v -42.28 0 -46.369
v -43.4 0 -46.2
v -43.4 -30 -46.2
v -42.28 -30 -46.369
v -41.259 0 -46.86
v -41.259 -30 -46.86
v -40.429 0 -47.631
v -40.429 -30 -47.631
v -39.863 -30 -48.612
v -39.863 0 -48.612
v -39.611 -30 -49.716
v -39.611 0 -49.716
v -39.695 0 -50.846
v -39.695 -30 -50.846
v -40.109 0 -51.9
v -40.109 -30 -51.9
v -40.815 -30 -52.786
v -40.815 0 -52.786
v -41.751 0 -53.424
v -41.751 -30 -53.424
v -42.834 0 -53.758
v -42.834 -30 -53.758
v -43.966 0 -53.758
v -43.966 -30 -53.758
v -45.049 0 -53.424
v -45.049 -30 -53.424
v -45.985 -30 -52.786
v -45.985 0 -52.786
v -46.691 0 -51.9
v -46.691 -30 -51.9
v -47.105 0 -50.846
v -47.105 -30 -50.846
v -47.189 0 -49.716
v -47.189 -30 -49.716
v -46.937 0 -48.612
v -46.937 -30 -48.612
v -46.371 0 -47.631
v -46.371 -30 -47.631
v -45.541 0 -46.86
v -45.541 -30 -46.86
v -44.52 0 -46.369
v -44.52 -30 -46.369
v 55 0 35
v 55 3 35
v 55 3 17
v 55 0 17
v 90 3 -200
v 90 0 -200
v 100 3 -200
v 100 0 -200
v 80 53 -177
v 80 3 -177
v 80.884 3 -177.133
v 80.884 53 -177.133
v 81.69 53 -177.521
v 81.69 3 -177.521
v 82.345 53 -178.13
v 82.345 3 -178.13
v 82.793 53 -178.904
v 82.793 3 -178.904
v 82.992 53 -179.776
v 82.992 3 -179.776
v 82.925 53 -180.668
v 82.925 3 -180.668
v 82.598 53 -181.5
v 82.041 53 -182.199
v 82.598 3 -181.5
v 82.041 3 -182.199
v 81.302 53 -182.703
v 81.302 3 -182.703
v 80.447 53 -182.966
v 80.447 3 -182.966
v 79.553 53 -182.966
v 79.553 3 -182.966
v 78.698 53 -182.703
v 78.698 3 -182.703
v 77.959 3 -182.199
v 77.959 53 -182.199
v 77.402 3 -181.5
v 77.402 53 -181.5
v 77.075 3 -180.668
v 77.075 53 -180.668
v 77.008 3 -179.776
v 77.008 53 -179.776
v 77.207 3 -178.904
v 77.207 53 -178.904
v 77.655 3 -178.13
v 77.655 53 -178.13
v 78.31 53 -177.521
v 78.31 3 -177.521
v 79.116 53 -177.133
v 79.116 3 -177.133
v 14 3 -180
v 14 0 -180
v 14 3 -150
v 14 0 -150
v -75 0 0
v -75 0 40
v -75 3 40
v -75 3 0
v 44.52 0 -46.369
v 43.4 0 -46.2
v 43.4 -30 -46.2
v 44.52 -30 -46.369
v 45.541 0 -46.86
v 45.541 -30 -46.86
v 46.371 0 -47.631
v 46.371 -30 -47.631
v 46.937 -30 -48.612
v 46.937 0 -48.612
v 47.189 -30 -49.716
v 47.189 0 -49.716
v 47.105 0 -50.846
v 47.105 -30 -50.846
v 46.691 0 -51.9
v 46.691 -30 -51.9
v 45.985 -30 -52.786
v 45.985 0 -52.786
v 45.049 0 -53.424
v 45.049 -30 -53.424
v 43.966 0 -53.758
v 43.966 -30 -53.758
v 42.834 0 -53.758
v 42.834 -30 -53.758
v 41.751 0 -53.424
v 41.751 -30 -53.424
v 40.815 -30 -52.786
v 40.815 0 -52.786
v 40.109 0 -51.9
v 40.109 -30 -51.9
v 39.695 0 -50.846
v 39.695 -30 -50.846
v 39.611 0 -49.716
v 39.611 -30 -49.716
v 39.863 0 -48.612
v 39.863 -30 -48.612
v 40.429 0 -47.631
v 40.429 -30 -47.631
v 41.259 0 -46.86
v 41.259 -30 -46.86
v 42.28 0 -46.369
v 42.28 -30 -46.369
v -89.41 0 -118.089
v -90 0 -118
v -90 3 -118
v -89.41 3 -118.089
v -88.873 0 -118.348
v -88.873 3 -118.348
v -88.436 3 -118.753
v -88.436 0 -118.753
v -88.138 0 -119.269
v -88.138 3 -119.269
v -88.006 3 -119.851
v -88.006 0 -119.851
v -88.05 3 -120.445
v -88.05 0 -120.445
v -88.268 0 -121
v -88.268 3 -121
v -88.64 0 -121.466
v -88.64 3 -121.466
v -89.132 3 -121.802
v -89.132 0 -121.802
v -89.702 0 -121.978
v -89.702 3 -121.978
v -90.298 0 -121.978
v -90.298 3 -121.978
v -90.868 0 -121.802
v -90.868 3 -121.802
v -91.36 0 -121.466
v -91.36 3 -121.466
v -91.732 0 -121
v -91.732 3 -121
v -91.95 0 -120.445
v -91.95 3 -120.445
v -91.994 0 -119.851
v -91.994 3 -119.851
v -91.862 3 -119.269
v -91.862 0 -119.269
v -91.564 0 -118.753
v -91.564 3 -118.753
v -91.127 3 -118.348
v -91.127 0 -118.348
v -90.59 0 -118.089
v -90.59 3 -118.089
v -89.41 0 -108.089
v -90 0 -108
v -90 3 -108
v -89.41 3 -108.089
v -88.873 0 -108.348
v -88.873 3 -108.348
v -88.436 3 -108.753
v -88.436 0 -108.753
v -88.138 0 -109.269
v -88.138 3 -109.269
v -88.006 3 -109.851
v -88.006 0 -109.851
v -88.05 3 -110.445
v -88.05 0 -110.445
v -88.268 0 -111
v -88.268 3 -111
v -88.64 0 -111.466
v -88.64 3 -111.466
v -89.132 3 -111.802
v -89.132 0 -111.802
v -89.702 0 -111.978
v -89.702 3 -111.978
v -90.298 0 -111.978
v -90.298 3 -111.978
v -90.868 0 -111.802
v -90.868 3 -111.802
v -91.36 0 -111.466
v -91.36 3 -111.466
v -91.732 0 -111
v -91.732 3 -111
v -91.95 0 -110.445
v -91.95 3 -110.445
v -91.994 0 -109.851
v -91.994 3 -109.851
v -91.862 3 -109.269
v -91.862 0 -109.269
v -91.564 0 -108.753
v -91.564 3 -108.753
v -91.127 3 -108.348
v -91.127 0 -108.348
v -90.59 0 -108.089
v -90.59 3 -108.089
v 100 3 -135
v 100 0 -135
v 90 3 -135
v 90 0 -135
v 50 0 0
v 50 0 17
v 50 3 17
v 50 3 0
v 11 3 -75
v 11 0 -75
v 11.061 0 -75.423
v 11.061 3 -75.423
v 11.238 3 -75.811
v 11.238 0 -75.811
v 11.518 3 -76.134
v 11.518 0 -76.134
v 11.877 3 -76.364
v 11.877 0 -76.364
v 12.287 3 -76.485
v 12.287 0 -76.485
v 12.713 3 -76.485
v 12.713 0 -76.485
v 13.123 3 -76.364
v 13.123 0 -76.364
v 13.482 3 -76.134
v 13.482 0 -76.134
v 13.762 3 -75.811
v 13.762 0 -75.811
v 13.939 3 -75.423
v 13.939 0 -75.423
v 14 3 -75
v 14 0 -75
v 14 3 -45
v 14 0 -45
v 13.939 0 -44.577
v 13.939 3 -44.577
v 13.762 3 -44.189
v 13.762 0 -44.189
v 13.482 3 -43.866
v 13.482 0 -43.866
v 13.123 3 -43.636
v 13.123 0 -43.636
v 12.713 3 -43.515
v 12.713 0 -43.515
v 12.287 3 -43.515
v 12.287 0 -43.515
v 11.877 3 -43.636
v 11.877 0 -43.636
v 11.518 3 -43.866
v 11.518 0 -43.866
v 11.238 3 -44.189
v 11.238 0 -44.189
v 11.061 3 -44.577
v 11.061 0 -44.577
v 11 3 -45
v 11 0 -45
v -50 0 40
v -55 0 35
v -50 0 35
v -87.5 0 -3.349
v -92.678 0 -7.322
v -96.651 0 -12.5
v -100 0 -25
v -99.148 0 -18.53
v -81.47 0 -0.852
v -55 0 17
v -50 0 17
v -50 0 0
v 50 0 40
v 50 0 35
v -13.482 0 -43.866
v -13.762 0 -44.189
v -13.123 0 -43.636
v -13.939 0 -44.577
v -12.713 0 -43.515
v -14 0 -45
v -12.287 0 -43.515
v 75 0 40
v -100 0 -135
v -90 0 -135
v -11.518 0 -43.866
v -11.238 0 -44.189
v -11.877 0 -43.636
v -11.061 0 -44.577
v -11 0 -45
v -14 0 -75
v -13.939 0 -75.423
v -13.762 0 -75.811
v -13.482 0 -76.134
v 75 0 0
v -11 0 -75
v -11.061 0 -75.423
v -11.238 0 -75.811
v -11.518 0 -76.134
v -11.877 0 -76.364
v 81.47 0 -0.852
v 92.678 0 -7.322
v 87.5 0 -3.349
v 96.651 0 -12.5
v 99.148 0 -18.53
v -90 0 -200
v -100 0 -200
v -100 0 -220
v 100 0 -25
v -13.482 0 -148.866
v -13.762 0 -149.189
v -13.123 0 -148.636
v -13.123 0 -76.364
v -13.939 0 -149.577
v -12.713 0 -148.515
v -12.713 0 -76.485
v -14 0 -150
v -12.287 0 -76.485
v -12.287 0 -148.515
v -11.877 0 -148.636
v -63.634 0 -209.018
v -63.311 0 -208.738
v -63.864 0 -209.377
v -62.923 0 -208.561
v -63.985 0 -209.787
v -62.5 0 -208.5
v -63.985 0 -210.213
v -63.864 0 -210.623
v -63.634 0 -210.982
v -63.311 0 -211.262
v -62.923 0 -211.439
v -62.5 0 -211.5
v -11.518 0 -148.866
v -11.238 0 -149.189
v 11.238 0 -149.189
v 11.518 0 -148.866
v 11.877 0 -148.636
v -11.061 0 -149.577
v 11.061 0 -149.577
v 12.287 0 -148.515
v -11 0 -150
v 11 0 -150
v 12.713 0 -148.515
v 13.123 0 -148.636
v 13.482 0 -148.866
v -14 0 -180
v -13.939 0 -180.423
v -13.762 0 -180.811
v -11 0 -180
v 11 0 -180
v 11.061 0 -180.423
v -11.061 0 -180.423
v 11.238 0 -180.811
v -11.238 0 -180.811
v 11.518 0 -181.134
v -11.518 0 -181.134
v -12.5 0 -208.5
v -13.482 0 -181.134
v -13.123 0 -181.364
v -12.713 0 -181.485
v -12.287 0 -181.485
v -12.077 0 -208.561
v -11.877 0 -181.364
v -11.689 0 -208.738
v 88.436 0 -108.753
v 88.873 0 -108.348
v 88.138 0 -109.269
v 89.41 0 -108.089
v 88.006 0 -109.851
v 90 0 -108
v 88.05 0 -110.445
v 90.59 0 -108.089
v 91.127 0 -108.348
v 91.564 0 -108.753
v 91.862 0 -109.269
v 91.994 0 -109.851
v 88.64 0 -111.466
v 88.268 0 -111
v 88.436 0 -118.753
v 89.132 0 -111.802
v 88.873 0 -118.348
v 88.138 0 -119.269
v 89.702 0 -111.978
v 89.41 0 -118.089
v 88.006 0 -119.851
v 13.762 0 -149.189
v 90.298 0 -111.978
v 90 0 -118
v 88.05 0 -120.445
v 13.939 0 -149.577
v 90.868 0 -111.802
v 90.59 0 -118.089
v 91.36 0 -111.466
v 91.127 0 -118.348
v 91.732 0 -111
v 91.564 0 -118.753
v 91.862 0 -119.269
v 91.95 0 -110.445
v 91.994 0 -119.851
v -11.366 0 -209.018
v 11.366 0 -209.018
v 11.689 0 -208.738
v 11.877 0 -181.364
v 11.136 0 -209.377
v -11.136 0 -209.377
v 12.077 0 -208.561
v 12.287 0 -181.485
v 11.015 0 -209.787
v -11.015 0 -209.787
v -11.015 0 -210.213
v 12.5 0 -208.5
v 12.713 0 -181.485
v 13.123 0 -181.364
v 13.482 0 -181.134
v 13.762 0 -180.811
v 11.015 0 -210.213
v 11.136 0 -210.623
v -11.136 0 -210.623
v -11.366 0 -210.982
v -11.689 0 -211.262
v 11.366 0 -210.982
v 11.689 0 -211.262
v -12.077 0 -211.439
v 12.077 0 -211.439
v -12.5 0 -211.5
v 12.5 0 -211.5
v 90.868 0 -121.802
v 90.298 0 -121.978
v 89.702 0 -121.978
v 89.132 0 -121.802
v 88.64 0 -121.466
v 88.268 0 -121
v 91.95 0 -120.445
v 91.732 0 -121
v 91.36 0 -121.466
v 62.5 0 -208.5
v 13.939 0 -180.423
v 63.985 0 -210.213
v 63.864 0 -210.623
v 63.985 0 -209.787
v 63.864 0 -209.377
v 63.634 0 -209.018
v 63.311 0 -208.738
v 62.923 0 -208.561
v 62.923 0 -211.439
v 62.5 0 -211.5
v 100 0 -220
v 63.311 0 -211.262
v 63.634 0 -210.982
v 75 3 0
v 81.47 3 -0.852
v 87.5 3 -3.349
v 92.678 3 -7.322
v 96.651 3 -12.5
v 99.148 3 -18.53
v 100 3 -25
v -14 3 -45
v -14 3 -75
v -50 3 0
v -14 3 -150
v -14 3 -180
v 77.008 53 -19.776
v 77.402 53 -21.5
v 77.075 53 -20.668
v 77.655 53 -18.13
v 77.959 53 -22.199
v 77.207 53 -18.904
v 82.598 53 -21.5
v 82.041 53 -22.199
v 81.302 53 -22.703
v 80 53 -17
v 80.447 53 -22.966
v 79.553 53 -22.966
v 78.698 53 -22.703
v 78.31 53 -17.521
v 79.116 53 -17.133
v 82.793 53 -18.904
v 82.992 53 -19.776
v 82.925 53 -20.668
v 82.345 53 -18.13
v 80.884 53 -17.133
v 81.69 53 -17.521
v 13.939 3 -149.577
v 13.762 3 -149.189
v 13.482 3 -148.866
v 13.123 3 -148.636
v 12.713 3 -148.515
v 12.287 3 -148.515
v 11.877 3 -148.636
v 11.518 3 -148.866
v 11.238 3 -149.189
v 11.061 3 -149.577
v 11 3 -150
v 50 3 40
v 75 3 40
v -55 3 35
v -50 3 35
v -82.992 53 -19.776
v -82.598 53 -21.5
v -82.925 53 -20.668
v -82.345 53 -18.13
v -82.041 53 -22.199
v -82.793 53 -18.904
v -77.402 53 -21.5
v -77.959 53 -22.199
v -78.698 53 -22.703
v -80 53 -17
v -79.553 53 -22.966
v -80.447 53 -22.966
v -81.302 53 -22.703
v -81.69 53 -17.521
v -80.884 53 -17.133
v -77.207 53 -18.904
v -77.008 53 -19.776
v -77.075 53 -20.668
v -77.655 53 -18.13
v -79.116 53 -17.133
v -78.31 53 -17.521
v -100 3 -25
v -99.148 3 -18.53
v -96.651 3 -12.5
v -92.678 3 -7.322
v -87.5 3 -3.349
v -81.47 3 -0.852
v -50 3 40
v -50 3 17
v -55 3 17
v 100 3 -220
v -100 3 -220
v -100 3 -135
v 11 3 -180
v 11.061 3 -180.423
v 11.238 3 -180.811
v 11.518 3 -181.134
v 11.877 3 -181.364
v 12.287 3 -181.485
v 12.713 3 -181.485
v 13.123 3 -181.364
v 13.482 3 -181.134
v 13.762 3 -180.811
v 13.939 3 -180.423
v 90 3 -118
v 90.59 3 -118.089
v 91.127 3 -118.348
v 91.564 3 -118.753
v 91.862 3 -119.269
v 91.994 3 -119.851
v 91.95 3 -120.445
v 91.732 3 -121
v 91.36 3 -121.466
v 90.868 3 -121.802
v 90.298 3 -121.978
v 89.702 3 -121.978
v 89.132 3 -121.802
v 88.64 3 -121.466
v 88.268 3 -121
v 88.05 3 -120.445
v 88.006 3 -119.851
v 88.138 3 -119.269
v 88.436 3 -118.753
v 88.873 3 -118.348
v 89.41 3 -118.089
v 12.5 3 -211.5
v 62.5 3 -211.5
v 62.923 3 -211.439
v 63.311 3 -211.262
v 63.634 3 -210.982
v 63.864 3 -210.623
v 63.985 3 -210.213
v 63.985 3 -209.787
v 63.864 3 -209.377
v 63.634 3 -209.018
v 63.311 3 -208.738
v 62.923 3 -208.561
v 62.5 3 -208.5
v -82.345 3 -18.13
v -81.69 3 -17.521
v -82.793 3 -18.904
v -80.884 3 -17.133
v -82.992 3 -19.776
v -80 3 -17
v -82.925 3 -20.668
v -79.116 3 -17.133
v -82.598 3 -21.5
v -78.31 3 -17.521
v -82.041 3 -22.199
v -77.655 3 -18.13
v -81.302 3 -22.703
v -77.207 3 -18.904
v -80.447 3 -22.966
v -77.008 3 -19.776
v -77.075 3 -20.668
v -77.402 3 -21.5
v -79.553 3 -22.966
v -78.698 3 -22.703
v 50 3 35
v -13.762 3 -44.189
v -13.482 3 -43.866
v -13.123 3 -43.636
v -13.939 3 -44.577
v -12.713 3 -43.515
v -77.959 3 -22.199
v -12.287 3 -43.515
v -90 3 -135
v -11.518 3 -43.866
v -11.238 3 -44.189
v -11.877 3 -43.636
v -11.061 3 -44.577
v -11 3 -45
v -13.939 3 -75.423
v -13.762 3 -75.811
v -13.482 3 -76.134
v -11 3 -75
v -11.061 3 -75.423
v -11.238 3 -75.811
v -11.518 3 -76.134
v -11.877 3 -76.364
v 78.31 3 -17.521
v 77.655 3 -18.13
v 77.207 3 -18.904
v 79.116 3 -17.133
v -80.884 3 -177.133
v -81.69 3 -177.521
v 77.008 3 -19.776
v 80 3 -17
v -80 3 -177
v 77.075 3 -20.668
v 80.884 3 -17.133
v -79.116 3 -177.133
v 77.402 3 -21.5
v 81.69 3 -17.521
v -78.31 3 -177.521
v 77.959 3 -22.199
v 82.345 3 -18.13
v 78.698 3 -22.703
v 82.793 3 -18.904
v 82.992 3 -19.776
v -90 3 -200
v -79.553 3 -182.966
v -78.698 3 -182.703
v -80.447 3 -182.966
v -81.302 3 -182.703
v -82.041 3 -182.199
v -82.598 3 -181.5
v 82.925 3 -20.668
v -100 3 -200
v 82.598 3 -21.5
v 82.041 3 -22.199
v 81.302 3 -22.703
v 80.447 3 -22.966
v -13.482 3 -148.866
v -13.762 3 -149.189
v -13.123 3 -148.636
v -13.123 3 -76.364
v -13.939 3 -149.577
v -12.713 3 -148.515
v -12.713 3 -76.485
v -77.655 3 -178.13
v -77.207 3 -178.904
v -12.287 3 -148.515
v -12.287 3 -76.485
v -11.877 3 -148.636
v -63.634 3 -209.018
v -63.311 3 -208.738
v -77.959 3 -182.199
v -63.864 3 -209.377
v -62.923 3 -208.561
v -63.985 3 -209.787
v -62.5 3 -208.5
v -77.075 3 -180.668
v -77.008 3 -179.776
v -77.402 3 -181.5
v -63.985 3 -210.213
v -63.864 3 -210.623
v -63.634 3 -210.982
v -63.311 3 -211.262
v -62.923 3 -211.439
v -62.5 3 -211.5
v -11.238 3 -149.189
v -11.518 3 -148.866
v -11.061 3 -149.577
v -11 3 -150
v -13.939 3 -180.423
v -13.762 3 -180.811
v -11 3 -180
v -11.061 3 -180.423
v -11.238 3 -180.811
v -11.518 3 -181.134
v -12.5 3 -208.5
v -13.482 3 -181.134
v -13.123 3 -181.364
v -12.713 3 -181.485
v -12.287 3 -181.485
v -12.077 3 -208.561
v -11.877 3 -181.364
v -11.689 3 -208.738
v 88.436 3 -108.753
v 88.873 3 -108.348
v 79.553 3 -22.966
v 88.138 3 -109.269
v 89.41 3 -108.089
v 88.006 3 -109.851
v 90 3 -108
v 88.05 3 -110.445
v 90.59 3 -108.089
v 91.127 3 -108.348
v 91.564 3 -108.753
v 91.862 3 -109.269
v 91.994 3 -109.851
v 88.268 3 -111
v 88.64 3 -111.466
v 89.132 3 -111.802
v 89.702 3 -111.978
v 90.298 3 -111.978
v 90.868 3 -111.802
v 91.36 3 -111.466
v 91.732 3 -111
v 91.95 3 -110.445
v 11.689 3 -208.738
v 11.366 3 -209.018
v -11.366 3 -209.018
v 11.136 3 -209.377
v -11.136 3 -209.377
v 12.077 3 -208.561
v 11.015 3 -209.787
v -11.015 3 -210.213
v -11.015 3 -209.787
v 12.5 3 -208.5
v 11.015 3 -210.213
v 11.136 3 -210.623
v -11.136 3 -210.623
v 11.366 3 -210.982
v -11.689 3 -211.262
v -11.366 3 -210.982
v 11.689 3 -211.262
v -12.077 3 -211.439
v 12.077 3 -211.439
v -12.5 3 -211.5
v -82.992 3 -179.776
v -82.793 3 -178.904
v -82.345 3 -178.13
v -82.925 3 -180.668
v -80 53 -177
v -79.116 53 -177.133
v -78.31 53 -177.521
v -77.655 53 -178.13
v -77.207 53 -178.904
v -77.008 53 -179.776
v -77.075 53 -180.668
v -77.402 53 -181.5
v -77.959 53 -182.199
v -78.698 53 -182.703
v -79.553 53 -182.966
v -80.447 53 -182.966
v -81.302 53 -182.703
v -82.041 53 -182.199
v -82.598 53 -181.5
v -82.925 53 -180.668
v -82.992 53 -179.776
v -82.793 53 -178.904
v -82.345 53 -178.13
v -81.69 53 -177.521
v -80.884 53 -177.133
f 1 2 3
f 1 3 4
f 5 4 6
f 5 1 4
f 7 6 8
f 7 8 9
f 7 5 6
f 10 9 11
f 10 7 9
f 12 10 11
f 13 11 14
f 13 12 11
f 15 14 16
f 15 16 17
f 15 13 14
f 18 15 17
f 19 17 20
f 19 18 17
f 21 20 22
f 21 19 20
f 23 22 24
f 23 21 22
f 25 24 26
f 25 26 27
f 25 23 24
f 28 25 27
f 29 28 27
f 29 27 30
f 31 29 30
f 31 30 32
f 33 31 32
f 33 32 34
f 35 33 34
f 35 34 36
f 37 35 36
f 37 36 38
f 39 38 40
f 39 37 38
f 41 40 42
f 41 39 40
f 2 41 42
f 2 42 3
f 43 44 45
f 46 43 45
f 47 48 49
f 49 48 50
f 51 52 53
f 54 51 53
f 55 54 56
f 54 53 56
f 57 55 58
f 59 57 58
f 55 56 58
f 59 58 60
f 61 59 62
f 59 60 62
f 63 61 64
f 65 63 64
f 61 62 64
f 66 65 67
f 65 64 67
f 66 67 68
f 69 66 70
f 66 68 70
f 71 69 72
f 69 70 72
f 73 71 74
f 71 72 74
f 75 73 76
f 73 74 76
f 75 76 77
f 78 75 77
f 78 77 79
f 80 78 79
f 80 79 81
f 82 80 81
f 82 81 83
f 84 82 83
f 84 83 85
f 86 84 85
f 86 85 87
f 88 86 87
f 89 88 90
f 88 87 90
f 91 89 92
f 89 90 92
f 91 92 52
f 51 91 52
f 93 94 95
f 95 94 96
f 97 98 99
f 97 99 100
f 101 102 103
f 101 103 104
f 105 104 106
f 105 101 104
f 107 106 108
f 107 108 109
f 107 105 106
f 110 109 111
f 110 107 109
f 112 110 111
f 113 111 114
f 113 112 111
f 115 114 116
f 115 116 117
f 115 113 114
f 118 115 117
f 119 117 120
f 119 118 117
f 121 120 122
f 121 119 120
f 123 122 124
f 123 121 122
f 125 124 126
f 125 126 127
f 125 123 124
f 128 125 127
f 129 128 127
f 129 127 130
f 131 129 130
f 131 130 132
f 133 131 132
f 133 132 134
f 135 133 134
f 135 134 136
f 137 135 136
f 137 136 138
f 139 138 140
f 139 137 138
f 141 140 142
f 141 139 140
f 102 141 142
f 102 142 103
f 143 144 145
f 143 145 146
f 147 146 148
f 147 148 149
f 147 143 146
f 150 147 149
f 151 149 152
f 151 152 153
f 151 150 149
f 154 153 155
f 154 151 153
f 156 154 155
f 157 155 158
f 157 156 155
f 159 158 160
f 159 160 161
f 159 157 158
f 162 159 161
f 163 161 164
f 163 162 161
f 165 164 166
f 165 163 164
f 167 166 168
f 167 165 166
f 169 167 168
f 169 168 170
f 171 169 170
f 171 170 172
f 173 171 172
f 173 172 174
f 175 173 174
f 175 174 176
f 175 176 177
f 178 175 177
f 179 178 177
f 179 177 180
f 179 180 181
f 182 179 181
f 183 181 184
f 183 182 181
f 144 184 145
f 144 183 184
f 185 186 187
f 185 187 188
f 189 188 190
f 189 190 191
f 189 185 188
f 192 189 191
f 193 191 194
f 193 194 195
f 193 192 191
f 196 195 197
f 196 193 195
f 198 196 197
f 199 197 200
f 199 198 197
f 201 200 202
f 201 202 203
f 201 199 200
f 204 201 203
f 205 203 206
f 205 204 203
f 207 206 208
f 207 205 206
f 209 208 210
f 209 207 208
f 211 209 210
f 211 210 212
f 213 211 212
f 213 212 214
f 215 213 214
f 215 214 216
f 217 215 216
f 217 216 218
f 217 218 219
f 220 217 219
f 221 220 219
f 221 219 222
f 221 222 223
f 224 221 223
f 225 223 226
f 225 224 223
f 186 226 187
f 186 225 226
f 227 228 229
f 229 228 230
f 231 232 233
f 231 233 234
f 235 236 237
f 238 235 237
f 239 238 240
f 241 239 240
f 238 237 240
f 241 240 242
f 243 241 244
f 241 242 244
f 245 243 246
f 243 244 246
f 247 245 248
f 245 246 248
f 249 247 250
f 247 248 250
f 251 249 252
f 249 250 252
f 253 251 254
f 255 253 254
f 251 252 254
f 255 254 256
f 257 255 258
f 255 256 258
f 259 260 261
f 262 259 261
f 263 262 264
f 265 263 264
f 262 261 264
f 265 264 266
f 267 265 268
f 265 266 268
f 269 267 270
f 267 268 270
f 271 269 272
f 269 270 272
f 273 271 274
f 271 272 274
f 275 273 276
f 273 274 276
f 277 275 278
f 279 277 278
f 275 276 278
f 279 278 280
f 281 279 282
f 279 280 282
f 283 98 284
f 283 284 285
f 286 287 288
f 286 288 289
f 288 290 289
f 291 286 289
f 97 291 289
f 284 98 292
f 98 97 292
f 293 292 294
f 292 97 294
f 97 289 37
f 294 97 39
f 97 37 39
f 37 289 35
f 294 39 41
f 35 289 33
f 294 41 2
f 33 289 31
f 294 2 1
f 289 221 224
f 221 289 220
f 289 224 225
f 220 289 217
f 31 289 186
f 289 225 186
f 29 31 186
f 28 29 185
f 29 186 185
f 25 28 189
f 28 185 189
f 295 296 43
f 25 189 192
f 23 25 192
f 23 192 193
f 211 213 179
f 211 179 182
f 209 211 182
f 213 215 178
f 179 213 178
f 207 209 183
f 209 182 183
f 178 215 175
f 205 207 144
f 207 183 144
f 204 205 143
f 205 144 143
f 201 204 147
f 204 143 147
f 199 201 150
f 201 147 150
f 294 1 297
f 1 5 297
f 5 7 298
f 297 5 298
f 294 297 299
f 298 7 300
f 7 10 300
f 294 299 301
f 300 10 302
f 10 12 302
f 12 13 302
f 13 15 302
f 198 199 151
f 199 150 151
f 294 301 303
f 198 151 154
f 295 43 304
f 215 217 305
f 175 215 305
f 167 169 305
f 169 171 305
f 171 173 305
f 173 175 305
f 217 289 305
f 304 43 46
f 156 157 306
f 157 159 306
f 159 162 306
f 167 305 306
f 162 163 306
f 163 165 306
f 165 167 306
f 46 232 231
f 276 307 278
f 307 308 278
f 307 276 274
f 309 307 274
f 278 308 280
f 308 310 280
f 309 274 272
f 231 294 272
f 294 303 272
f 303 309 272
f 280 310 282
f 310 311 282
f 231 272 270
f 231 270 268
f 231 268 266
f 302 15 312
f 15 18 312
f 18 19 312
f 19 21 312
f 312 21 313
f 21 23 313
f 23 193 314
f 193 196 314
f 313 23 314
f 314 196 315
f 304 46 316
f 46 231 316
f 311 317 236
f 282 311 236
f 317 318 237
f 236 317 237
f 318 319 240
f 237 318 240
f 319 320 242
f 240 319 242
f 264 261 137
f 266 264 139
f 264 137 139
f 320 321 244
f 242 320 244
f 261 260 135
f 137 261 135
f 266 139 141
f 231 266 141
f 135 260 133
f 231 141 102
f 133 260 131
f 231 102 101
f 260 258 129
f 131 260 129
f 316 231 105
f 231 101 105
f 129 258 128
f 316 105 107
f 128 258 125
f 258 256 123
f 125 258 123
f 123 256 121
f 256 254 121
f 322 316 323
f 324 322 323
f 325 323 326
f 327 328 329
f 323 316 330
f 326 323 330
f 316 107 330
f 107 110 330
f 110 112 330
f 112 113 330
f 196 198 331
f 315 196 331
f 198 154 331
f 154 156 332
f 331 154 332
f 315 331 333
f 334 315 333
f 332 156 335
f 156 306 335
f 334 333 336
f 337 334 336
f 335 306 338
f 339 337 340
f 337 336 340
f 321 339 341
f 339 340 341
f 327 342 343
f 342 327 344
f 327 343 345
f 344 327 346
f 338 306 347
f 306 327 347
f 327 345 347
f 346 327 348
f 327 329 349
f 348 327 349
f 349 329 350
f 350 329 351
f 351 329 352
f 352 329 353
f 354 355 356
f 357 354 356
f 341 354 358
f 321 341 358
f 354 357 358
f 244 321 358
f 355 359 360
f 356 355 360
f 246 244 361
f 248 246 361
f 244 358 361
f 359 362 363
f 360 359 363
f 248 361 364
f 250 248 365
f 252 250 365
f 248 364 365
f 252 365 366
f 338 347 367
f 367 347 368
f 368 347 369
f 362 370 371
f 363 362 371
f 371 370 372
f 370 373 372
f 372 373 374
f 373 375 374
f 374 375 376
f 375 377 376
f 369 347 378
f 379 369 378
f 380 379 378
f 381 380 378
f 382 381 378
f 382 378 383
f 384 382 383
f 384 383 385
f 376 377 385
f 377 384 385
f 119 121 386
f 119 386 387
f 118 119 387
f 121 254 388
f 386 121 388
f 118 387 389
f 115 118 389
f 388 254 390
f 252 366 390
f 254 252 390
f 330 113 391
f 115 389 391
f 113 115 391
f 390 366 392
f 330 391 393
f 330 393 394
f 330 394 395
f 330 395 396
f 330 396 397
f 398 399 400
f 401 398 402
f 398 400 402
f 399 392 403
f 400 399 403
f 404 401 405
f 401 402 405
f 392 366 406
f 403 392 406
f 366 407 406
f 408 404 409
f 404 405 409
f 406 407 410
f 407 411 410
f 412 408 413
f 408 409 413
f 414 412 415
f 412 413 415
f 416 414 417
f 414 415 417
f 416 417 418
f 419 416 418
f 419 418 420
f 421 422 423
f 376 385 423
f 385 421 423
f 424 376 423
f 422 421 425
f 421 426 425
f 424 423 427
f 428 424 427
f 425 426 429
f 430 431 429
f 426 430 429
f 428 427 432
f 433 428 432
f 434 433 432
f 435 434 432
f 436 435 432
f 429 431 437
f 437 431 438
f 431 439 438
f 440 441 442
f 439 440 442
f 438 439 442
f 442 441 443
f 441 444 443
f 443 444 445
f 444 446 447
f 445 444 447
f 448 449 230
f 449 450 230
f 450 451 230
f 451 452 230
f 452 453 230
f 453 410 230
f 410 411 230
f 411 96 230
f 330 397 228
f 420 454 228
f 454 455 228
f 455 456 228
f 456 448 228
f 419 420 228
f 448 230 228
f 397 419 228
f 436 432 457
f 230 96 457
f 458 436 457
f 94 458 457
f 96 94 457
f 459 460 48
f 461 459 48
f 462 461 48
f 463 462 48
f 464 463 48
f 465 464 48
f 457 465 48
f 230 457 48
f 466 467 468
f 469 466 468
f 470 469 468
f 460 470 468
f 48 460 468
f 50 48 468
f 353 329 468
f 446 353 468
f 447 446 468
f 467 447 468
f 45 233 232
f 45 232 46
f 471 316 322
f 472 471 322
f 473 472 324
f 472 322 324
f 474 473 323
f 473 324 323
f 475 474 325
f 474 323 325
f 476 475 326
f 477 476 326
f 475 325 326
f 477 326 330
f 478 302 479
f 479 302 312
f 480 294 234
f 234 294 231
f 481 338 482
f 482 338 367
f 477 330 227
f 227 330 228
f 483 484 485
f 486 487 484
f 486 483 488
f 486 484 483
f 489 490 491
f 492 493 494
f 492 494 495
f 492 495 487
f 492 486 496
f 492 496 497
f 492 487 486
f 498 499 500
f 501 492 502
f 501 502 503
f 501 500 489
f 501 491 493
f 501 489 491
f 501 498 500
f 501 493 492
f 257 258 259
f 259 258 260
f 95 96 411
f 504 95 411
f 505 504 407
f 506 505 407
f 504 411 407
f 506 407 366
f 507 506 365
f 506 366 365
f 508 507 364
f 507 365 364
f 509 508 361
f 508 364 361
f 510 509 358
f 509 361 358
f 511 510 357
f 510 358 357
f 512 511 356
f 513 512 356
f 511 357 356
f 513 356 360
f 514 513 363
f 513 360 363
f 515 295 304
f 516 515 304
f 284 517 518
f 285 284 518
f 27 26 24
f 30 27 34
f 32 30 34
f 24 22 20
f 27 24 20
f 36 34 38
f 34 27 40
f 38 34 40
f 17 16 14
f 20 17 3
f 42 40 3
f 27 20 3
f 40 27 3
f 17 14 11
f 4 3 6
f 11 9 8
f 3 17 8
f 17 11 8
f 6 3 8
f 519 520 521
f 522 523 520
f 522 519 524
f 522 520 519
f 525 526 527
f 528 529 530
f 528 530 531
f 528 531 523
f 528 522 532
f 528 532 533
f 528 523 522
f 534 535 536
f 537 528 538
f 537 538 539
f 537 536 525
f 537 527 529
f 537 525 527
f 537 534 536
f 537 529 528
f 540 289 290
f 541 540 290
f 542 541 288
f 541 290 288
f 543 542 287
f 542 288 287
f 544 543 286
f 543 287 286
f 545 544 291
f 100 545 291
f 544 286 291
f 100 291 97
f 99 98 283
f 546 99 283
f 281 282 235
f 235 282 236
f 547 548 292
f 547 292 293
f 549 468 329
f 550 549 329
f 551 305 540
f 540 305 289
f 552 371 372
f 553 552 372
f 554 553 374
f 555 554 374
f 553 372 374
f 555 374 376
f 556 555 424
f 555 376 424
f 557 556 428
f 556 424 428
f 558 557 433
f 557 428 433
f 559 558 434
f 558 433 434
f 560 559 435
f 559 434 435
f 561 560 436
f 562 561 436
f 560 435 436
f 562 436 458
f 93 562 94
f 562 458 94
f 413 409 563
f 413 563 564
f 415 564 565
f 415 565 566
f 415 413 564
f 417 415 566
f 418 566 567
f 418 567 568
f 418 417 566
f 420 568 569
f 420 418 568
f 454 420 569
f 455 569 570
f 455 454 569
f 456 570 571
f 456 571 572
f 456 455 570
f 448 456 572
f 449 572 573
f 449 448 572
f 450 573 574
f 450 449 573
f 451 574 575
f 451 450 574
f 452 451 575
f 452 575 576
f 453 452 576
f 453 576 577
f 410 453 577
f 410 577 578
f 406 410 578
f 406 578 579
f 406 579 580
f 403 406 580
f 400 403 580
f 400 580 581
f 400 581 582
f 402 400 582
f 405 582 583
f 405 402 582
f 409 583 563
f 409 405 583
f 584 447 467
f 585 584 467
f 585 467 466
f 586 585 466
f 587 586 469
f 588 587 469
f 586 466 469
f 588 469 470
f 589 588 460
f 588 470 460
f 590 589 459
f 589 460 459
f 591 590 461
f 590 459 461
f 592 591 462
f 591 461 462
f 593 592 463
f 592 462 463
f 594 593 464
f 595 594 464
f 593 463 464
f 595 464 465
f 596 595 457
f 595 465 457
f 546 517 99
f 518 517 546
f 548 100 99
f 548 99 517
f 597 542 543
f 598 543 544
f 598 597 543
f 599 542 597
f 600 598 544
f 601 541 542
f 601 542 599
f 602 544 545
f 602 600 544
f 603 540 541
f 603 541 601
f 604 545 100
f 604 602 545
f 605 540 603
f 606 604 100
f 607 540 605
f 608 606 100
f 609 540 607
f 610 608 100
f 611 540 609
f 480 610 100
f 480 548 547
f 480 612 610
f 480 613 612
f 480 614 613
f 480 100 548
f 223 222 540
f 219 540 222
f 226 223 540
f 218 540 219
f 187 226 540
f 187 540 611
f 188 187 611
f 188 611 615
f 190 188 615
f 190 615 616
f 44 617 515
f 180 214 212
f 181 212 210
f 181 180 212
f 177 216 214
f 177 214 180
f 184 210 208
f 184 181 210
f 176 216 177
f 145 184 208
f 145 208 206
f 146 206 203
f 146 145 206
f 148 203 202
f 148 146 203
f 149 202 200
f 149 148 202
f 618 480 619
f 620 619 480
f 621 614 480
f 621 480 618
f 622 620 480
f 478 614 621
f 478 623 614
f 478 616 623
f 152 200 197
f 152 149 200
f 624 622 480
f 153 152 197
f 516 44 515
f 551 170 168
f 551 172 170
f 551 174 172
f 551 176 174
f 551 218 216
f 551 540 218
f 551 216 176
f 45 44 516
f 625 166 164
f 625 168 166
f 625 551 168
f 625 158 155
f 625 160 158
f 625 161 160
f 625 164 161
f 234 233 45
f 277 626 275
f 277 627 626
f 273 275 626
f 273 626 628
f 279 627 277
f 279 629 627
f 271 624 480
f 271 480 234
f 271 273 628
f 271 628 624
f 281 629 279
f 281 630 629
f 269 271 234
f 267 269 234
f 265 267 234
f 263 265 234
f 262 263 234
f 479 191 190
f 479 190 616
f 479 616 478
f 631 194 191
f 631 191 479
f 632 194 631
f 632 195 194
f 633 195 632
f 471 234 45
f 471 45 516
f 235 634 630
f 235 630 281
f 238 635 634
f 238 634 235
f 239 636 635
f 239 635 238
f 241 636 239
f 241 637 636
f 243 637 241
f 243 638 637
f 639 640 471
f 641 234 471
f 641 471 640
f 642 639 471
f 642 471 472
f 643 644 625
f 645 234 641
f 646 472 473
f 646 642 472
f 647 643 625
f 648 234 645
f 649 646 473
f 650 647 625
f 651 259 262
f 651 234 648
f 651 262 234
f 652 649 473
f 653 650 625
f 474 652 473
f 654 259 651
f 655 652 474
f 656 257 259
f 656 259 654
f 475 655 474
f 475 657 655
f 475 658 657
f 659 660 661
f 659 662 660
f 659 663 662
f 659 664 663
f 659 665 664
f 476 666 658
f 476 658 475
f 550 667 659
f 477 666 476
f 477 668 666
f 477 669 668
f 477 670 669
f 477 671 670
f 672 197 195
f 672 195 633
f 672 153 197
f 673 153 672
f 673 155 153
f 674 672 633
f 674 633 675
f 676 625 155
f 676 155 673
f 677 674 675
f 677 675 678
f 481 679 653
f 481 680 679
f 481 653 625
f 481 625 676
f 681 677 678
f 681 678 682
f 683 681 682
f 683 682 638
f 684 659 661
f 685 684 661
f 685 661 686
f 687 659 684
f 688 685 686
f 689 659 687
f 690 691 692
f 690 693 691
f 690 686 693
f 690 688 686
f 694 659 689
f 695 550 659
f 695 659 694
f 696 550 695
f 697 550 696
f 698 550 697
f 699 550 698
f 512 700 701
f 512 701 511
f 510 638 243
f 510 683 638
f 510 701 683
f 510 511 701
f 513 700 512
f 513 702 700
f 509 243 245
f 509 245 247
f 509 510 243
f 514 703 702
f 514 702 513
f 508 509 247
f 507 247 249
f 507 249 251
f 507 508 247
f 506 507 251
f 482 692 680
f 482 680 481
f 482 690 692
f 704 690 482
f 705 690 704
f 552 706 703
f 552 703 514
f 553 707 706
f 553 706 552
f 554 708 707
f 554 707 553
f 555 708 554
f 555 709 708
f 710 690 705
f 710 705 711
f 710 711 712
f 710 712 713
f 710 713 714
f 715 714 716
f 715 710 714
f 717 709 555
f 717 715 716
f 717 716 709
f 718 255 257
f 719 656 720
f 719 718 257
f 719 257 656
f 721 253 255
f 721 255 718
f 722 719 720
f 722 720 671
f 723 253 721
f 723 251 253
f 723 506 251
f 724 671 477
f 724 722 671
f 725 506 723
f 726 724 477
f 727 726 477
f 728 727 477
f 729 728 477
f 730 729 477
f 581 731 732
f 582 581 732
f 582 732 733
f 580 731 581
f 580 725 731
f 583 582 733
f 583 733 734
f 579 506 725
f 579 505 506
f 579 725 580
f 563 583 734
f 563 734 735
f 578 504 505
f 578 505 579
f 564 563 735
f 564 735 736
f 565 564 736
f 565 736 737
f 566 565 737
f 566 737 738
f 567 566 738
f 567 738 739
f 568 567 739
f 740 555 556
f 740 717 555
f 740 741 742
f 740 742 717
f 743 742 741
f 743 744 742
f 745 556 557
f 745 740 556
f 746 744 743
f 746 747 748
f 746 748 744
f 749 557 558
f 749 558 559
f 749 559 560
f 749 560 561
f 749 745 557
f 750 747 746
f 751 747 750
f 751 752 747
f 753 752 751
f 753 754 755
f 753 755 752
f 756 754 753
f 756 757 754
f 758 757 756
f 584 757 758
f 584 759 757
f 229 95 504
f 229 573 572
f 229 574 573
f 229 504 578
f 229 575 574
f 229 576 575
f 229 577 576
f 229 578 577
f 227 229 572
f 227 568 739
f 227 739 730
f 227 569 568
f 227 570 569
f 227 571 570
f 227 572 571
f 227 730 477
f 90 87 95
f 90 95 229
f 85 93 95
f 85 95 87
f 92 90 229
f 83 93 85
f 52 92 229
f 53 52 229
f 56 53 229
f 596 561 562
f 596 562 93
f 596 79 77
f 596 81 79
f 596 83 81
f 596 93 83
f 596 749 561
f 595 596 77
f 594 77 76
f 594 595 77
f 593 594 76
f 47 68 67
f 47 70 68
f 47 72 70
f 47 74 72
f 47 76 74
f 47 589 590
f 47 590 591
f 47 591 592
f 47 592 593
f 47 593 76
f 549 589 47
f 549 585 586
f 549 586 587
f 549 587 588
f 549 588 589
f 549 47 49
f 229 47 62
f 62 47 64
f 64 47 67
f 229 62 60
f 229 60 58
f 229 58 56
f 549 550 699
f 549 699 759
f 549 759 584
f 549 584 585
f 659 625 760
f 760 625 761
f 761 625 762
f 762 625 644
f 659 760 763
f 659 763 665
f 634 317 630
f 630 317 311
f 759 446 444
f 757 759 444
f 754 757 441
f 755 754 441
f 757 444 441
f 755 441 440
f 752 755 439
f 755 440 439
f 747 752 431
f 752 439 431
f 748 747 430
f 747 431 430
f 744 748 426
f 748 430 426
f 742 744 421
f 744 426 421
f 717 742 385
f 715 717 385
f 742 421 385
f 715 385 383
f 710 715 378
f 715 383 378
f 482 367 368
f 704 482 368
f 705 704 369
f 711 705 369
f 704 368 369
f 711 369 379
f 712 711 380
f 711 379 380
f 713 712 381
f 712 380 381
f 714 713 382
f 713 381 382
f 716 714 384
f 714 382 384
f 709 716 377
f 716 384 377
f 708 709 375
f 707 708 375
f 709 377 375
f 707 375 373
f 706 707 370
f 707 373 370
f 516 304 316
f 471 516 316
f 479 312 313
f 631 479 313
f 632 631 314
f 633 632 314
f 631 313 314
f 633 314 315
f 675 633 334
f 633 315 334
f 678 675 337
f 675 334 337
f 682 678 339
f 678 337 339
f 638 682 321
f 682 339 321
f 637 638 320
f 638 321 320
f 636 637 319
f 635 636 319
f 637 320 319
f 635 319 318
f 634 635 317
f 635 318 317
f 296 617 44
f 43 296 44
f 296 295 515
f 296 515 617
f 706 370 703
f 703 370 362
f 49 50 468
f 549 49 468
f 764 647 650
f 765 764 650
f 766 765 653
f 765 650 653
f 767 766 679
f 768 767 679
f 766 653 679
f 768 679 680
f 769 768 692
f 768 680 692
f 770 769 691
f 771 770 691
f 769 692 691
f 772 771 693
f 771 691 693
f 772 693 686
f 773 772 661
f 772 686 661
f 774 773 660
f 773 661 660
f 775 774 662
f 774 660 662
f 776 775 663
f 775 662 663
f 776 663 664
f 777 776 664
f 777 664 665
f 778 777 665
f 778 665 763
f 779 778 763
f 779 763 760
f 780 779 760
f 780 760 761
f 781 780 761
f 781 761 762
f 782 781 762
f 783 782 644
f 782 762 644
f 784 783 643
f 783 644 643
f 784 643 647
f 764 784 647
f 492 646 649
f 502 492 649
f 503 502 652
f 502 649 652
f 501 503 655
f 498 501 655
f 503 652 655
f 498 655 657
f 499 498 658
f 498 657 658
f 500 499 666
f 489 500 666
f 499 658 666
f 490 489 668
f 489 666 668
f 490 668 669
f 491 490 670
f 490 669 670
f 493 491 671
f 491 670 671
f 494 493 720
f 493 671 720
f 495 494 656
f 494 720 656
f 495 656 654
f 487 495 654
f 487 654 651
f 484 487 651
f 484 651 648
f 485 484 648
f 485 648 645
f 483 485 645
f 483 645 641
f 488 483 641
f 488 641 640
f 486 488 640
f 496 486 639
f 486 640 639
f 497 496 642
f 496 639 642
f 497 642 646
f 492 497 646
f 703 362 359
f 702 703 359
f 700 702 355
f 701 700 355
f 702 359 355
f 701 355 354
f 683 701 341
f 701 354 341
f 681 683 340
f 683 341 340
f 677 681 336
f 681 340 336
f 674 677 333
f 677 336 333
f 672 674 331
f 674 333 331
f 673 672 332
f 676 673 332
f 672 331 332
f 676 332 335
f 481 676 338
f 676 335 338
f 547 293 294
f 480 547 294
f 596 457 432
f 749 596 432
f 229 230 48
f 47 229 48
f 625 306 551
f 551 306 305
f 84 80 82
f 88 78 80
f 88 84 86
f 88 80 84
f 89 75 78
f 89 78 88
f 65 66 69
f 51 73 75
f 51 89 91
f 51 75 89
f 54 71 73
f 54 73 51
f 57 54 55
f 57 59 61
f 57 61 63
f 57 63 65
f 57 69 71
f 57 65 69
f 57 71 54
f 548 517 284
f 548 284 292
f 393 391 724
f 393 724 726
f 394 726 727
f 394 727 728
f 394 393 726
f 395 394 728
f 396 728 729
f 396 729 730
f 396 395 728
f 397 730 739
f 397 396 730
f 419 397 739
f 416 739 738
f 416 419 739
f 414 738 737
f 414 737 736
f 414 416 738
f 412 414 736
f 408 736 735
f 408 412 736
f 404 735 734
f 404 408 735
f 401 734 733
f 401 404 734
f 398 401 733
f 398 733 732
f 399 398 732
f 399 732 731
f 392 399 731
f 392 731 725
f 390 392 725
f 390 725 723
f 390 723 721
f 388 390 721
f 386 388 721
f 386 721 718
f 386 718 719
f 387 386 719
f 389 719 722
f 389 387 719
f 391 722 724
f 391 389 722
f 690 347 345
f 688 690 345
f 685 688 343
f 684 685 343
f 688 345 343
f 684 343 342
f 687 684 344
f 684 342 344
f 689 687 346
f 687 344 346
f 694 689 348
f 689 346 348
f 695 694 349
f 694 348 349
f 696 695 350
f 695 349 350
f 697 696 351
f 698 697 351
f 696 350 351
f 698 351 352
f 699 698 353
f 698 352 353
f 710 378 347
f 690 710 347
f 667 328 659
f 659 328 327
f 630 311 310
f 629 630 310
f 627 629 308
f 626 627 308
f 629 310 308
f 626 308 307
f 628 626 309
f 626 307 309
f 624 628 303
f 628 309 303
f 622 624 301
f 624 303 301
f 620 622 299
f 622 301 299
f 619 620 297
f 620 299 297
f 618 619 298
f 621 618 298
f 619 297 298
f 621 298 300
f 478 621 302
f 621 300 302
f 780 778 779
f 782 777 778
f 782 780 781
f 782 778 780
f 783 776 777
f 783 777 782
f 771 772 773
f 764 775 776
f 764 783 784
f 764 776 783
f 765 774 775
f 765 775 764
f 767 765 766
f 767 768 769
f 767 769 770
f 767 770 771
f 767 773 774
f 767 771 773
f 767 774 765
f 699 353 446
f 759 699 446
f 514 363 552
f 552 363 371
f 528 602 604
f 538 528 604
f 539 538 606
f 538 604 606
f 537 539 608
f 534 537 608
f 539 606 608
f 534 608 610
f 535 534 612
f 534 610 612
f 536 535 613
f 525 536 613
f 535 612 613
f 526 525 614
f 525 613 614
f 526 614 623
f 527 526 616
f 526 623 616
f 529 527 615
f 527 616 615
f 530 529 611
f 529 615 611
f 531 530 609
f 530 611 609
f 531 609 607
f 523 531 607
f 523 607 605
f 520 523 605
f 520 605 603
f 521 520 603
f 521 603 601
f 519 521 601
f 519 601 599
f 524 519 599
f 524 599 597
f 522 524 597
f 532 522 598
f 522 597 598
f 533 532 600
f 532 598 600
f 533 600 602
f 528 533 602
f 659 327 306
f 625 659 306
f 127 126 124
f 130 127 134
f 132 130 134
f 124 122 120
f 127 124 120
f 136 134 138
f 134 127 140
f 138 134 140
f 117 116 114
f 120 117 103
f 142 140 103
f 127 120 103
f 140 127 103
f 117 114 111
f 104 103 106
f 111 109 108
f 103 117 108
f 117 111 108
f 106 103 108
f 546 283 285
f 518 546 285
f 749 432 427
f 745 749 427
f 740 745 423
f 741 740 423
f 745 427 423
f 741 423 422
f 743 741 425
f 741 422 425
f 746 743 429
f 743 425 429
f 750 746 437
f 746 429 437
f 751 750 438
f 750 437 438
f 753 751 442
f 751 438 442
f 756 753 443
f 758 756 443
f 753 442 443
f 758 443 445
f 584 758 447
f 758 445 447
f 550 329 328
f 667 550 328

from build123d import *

# Parameters (mm, degrees)
SKETCH1_R           = 2
BOSS_EXTRUDE1_DEPTH = 3
SKETCH2_R           = 3
BOSS_EXTRUDE2_DEPTH = 50
SKETCH3_R           = 3.8
BOSS_EXTRUDE3_DEPTH = 30
SKETCH1_3_W         = 25
SKETCH1_3_H         = 40
BOSS_EXTRUDE4_DEPTH = 3
SKETCH4_W           = 5
SKETCH4_H           = 18
CUT_EXTRUDE1_DEPTH  = 10


with BuildPart() as part:
    # Sketch1 → Boss-Extrude1 (new body)
    with BuildSketch(Plane(origin=(0, 0, 0), x_dir=(1, 0, 0), z_dir=(0, 1, 0))):
        with BuildLine():
            ThreePointArc((-100, 25), (-92.67766953, 7.32233047), (-75, 0))
            Line((-75, 0), (-50, 0))
            Line((-50, 0), (50, 0))
            Line((50, 0), (75, 0))
            ThreePointArc((75, 0), (92.67766953, 7.32233047), (100, 25))
            Line((100, 25), (100, 135))
            Line((100, 135), (90, 135))
            Line((90, 135), (90, 200))
            Line((90, 200), (100, 200))
            Line((100, 200), (100, 220))
            Line((100, 220), (-100, 220))
            Line((-100, 220), (-100, 200))
            Line((-100, 200), (-90, 200))
            Line((-90, 200), (-90, 135))
            Line((-90, 135), (-100, 135))
            Line((-100, 135), (-100, 25))
        make_face()
        with BuildLine():
            Line((-14, 45), (-14, 75))
            ThreePointArc((-14, 75), (-12.5, 76.5), (-11, 75))
            Line((-11, 75), (-11, 45))
            ThreePointArc((-11, 45), (-12.5, 43.5), (-14, 45))
        make_face(mode=Mode.SUBTRACT)
        with BuildLine():
            ThreePointArc((11, 75), (12.5, 76.5), (14, 75))
            Line((14, 75), (14, 45))
            ThreePointArc((14, 45), (12.5, 43.5), (11, 45))
            Line((11, 45), (11, 75))
        make_face(mode=Mode.SUBTRACT)
        with Locations((-90, 110)):
            Circle(SKETCH1_R, mode=Mode.SUBTRACT)
        with Locations((-90, 120)):
            Circle(SKETCH1_R, mode=Mode.SUBTRACT)
        with BuildLine():
            Line((-14, 150), (-14, 180))
            ThreePointArc((-14, 180), (-12.5, 181.5), (-11, 180))
            Line((-11, 180), (-11, 150))
            ThreePointArc((-11, 150), (-12.5, 148.5), (-14, 150))
        make_face(mode=Mode.SUBTRACT)
        with BuildLine():
            Line((-62.5, 211.5), (-12.5, 211.5))
            ThreePointArc((-12.5, 211.5), (-11, 210), (-12.5, 208.5))
            Line((-12.5, 208.5), (-62.5, 208.5))
            ThreePointArc((-62.5, 208.5), (-64, 210), (-62.5, 211.5))
        make_face(mode=Mode.SUBTRACT)
        with Locations((90, 110)):
            Circle(SKETCH1_R, mode=Mode.SUBTRACT)
        with Locations((90, 120)):
            Circle(SKETCH1_R, mode=Mode.SUBTRACT)
        with BuildLine():
            ThreePointArc((11, 180), (12.5, 181.5), (14, 180))
            Line((14, 180), (14, 150))
            ThreePointArc((14, 150), (12.5, 148.5), (11, 150))
            Line((11, 150), (11, 180))
        make_face(mode=Mode.SUBTRACT)
        with BuildLine():
            ThreePointArc((12.5, 208.5), (11, 210), (12.5, 211.5))
            Line((12.5, 211.5), (62.5, 211.5))
            ThreePointArc((62.5, 211.5), (64, 210), (62.5, 208.5))
            Line((62.5, 208.5), (12.5, 208.5))
        make_face(mode=Mode.SUBTRACT)
    extrude(amount=BOSS_EXTRUDE1_DEPTH)

    # Sketch2 → Boss-Extrude2 (add)
    with BuildSketch(Plane(origin=(0, 3, 0), x_dir=(1, 0, 0), z_dir=(0, 1, 0))):
        with Locations((-80, 20)):
            Circle(SKETCH2_R)
        with Locations((80, 20)):
            Circle(SKETCH2_R)
        with Locations((-80, 180)):
            Circle(SKETCH2_R)
        with Locations((80, 180)):
            Circle(SKETCH2_R)
    extrude(amount=BOSS_EXTRUDE2_DEPTH)

    # Sketch3 → Boss-Extrude3 (add)
    with BuildSketch(Plane(origin=(0, 0, 0), x_dir=(1, 0, 0), z_dir=(0, 1, 0))):
        with Locations((-43.4, 50)):
            Circle(SKETCH3_R)
        with Locations((43.4, 50)):
            Circle(SKETCH3_R)
    extrude(amount=-BOSS_EXTRUDE3_DEPTH)

    # Sketch1<3> → Boss-Extrude4 (add)
    with BuildSketch(Plane(origin=(0, 0, 0), x_dir=(1, 0, 0), z_dir=(0, 1, 0))):
        with Locations((-62.5, -20)):
            Rectangle(SKETCH1_3_W, SKETCH1_3_H)
        with Locations((62.5, -20)):
            Rectangle(SKETCH1_3_W, SKETCH1_3_H)
    extrude(amount=BOSS_EXTRUDE4_DEPTH)

    # Sketch4 → Cut-Extrude1 (cut)
    with BuildSketch(Plane(origin=(0, 3, 0), x_dir=(1, 0, 0), z_dir=(0, 1, 0))):
        with Locations((-52.5, -26)):
            Rectangle(SKETCH4_W, SKETCH4_H)
        with Locations((52.5, -26)):
            Rectangle(SKETCH4_W, SKETCH4_H)
    extrude(amount=-CUT_EXTRUDE1_DEPTH, mode=Mode.SUBTRACT)


solid = part.part
